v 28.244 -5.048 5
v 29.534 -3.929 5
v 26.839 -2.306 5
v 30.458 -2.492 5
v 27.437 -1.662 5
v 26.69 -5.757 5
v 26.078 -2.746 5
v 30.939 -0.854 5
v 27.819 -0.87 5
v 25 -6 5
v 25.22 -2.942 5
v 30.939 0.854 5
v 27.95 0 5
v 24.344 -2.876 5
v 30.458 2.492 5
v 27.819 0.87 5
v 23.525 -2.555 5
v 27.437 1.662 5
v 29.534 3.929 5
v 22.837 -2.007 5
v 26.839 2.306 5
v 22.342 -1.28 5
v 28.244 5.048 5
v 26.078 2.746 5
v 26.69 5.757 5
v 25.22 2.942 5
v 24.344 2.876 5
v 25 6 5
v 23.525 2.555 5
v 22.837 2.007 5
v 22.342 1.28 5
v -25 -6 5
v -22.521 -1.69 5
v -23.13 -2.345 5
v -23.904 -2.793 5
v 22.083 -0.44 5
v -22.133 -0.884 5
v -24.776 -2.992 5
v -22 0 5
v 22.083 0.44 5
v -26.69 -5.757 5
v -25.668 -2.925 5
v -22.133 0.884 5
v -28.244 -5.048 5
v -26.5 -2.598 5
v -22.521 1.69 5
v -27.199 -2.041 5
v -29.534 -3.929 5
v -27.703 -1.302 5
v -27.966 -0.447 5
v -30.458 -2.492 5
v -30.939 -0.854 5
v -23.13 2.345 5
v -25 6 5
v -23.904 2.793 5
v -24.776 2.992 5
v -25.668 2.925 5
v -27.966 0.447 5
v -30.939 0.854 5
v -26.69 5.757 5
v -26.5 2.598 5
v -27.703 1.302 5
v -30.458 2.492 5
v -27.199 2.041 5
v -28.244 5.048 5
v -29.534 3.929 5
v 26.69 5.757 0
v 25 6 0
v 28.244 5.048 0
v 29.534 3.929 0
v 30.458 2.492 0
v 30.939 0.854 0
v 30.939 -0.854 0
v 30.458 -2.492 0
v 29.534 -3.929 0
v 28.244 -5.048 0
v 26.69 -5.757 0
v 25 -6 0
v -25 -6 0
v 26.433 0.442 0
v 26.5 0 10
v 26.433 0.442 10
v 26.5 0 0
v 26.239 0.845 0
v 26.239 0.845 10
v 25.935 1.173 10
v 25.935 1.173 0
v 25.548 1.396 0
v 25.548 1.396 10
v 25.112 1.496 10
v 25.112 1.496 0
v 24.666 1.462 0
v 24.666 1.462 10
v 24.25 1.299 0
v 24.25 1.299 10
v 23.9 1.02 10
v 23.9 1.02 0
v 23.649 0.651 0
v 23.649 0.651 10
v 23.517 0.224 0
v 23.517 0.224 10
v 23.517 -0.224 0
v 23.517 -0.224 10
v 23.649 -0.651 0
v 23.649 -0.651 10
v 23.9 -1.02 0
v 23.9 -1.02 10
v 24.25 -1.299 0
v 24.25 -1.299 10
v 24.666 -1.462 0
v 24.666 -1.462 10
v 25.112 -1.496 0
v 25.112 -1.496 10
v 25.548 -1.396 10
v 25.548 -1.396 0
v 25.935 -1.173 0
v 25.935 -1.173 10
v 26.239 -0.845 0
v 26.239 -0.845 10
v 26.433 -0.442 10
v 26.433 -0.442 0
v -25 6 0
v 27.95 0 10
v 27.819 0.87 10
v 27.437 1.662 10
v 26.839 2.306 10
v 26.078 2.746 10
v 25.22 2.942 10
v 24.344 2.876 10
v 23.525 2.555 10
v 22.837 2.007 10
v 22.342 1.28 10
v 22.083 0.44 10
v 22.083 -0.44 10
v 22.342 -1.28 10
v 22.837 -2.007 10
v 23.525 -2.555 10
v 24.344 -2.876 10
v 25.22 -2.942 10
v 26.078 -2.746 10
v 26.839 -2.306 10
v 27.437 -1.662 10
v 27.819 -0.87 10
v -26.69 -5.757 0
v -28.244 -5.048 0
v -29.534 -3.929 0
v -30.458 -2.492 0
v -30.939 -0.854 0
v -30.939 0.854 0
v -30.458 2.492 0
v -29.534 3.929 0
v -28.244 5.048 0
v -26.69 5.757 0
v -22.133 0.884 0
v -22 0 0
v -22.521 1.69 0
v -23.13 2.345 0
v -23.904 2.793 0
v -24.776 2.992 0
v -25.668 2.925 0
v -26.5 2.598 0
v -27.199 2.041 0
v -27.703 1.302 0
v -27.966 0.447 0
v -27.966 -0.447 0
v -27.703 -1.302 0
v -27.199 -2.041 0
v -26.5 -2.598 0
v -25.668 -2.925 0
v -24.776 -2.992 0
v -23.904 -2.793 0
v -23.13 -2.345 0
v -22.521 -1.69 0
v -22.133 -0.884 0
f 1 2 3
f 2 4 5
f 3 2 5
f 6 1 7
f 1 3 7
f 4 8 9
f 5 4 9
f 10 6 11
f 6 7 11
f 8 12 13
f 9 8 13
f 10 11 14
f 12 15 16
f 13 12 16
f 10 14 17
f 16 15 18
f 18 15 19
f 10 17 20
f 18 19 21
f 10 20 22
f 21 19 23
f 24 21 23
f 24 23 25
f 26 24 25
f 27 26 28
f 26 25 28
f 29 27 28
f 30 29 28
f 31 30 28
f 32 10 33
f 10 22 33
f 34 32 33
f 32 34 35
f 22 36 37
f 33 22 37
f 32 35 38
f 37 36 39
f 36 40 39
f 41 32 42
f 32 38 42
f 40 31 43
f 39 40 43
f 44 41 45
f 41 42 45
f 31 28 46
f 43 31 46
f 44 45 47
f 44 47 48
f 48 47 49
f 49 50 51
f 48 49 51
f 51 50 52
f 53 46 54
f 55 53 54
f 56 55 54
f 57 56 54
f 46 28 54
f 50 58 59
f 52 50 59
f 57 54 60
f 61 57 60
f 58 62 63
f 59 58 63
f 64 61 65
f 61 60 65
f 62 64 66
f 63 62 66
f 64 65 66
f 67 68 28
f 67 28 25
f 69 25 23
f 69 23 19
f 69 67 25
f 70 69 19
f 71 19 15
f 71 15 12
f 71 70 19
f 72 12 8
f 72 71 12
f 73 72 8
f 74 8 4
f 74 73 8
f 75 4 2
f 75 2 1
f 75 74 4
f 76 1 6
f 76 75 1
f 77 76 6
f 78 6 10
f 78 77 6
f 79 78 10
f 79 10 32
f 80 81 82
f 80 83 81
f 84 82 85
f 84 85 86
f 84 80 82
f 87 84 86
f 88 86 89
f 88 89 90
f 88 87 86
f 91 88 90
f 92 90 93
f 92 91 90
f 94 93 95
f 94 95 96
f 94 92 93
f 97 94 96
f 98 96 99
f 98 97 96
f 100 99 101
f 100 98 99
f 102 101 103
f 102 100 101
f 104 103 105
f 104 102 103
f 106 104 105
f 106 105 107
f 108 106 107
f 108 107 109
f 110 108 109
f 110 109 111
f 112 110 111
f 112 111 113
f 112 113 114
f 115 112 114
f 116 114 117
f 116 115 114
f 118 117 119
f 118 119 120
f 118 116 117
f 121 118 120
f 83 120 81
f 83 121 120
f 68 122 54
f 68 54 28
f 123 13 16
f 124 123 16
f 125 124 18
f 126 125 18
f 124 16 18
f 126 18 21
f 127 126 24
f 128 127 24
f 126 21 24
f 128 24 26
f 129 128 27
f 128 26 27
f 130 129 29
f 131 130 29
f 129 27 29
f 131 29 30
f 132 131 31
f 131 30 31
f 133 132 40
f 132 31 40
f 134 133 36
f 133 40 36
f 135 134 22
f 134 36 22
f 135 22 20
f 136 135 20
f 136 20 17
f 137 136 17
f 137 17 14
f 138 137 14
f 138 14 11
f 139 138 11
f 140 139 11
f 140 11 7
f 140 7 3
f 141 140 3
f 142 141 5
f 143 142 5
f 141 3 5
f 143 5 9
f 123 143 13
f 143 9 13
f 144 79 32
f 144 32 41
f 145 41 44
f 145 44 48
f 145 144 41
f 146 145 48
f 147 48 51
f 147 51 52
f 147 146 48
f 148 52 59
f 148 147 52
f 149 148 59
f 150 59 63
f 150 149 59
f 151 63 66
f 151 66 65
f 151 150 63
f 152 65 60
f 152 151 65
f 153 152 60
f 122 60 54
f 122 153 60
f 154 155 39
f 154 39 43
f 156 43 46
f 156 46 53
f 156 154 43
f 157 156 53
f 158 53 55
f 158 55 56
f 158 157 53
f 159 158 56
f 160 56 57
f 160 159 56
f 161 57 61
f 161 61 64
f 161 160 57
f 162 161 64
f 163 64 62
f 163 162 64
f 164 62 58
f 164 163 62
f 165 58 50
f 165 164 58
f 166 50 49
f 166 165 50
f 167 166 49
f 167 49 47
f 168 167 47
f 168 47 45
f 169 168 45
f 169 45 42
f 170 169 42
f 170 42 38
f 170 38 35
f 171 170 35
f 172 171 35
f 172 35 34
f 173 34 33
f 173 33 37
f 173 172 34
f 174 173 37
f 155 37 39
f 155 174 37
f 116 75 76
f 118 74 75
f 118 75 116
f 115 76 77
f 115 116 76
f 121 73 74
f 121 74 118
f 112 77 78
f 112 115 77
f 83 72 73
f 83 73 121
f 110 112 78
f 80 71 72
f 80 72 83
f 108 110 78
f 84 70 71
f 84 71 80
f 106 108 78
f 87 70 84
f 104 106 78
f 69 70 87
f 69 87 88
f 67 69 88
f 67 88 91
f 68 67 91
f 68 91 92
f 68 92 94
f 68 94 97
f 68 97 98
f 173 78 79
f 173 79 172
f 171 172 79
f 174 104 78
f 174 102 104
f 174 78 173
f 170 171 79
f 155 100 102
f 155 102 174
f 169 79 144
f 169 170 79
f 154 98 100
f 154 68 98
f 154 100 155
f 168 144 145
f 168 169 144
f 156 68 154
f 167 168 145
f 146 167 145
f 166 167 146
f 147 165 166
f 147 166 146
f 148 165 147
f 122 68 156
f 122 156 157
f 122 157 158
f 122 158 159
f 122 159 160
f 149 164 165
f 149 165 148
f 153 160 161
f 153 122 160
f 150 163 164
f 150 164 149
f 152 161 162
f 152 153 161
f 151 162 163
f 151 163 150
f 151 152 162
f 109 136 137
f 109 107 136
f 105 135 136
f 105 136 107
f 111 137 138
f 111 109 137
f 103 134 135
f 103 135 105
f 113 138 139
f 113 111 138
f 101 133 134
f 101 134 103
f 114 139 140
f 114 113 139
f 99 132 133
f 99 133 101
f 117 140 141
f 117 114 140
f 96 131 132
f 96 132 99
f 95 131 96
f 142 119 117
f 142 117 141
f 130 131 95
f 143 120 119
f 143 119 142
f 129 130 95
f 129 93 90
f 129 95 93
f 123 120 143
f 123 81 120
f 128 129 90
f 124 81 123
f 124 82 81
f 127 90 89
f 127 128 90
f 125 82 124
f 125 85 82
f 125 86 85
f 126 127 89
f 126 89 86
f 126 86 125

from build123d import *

# Parameters (mm, degrees)
SKETCH1_R           = 1.5
SKETCH1_R_2         = 3
BOSS_EXTRUDE1_DEPTH = 5
SKETCH2_R           = 2.95
SKETCH2_R_2         = 1.5
BOSS_EXTRUDE2_DEPTH = 5


with BuildPart() as part:
    # Sketch1 → Boss-Extrude1 (new body)
    with BuildSketch(Plane.XY):
        with BuildLine():
            Line((-25, 6), (25, 6))
            ThreePointArc((25, 6), (31, 0), (25, -6))
            Line((25, -6), (-25, -6))
            ThreePointArc((-25, -6), (-31, 0), (-25, 6))
        make_face()
        with Locations((25, 0)):
            Circle(SKETCH1_R, mode=Mode.SUBTRACT)
        with Locations((-25, 0)):
            Circle(SKETCH1_R_2, mode=Mode.SUBTRACT)
    extrude(amount=BOSS_EXTRUDE1_DEPTH)

    # Sketch2 → Boss-Extrude2 (add)
    with BuildSketch(Plane.XY.offset(5)):
        with Locations((25, 0)):
            Circle(SKETCH2_R)
        with Locations((25, 0)):
            Circle(SKETCH2_R_2, mode=Mode.SUBTRACT)
    extrude(amount=BOSS_EXTRUDE2_DEPTH)


solid = part.part
